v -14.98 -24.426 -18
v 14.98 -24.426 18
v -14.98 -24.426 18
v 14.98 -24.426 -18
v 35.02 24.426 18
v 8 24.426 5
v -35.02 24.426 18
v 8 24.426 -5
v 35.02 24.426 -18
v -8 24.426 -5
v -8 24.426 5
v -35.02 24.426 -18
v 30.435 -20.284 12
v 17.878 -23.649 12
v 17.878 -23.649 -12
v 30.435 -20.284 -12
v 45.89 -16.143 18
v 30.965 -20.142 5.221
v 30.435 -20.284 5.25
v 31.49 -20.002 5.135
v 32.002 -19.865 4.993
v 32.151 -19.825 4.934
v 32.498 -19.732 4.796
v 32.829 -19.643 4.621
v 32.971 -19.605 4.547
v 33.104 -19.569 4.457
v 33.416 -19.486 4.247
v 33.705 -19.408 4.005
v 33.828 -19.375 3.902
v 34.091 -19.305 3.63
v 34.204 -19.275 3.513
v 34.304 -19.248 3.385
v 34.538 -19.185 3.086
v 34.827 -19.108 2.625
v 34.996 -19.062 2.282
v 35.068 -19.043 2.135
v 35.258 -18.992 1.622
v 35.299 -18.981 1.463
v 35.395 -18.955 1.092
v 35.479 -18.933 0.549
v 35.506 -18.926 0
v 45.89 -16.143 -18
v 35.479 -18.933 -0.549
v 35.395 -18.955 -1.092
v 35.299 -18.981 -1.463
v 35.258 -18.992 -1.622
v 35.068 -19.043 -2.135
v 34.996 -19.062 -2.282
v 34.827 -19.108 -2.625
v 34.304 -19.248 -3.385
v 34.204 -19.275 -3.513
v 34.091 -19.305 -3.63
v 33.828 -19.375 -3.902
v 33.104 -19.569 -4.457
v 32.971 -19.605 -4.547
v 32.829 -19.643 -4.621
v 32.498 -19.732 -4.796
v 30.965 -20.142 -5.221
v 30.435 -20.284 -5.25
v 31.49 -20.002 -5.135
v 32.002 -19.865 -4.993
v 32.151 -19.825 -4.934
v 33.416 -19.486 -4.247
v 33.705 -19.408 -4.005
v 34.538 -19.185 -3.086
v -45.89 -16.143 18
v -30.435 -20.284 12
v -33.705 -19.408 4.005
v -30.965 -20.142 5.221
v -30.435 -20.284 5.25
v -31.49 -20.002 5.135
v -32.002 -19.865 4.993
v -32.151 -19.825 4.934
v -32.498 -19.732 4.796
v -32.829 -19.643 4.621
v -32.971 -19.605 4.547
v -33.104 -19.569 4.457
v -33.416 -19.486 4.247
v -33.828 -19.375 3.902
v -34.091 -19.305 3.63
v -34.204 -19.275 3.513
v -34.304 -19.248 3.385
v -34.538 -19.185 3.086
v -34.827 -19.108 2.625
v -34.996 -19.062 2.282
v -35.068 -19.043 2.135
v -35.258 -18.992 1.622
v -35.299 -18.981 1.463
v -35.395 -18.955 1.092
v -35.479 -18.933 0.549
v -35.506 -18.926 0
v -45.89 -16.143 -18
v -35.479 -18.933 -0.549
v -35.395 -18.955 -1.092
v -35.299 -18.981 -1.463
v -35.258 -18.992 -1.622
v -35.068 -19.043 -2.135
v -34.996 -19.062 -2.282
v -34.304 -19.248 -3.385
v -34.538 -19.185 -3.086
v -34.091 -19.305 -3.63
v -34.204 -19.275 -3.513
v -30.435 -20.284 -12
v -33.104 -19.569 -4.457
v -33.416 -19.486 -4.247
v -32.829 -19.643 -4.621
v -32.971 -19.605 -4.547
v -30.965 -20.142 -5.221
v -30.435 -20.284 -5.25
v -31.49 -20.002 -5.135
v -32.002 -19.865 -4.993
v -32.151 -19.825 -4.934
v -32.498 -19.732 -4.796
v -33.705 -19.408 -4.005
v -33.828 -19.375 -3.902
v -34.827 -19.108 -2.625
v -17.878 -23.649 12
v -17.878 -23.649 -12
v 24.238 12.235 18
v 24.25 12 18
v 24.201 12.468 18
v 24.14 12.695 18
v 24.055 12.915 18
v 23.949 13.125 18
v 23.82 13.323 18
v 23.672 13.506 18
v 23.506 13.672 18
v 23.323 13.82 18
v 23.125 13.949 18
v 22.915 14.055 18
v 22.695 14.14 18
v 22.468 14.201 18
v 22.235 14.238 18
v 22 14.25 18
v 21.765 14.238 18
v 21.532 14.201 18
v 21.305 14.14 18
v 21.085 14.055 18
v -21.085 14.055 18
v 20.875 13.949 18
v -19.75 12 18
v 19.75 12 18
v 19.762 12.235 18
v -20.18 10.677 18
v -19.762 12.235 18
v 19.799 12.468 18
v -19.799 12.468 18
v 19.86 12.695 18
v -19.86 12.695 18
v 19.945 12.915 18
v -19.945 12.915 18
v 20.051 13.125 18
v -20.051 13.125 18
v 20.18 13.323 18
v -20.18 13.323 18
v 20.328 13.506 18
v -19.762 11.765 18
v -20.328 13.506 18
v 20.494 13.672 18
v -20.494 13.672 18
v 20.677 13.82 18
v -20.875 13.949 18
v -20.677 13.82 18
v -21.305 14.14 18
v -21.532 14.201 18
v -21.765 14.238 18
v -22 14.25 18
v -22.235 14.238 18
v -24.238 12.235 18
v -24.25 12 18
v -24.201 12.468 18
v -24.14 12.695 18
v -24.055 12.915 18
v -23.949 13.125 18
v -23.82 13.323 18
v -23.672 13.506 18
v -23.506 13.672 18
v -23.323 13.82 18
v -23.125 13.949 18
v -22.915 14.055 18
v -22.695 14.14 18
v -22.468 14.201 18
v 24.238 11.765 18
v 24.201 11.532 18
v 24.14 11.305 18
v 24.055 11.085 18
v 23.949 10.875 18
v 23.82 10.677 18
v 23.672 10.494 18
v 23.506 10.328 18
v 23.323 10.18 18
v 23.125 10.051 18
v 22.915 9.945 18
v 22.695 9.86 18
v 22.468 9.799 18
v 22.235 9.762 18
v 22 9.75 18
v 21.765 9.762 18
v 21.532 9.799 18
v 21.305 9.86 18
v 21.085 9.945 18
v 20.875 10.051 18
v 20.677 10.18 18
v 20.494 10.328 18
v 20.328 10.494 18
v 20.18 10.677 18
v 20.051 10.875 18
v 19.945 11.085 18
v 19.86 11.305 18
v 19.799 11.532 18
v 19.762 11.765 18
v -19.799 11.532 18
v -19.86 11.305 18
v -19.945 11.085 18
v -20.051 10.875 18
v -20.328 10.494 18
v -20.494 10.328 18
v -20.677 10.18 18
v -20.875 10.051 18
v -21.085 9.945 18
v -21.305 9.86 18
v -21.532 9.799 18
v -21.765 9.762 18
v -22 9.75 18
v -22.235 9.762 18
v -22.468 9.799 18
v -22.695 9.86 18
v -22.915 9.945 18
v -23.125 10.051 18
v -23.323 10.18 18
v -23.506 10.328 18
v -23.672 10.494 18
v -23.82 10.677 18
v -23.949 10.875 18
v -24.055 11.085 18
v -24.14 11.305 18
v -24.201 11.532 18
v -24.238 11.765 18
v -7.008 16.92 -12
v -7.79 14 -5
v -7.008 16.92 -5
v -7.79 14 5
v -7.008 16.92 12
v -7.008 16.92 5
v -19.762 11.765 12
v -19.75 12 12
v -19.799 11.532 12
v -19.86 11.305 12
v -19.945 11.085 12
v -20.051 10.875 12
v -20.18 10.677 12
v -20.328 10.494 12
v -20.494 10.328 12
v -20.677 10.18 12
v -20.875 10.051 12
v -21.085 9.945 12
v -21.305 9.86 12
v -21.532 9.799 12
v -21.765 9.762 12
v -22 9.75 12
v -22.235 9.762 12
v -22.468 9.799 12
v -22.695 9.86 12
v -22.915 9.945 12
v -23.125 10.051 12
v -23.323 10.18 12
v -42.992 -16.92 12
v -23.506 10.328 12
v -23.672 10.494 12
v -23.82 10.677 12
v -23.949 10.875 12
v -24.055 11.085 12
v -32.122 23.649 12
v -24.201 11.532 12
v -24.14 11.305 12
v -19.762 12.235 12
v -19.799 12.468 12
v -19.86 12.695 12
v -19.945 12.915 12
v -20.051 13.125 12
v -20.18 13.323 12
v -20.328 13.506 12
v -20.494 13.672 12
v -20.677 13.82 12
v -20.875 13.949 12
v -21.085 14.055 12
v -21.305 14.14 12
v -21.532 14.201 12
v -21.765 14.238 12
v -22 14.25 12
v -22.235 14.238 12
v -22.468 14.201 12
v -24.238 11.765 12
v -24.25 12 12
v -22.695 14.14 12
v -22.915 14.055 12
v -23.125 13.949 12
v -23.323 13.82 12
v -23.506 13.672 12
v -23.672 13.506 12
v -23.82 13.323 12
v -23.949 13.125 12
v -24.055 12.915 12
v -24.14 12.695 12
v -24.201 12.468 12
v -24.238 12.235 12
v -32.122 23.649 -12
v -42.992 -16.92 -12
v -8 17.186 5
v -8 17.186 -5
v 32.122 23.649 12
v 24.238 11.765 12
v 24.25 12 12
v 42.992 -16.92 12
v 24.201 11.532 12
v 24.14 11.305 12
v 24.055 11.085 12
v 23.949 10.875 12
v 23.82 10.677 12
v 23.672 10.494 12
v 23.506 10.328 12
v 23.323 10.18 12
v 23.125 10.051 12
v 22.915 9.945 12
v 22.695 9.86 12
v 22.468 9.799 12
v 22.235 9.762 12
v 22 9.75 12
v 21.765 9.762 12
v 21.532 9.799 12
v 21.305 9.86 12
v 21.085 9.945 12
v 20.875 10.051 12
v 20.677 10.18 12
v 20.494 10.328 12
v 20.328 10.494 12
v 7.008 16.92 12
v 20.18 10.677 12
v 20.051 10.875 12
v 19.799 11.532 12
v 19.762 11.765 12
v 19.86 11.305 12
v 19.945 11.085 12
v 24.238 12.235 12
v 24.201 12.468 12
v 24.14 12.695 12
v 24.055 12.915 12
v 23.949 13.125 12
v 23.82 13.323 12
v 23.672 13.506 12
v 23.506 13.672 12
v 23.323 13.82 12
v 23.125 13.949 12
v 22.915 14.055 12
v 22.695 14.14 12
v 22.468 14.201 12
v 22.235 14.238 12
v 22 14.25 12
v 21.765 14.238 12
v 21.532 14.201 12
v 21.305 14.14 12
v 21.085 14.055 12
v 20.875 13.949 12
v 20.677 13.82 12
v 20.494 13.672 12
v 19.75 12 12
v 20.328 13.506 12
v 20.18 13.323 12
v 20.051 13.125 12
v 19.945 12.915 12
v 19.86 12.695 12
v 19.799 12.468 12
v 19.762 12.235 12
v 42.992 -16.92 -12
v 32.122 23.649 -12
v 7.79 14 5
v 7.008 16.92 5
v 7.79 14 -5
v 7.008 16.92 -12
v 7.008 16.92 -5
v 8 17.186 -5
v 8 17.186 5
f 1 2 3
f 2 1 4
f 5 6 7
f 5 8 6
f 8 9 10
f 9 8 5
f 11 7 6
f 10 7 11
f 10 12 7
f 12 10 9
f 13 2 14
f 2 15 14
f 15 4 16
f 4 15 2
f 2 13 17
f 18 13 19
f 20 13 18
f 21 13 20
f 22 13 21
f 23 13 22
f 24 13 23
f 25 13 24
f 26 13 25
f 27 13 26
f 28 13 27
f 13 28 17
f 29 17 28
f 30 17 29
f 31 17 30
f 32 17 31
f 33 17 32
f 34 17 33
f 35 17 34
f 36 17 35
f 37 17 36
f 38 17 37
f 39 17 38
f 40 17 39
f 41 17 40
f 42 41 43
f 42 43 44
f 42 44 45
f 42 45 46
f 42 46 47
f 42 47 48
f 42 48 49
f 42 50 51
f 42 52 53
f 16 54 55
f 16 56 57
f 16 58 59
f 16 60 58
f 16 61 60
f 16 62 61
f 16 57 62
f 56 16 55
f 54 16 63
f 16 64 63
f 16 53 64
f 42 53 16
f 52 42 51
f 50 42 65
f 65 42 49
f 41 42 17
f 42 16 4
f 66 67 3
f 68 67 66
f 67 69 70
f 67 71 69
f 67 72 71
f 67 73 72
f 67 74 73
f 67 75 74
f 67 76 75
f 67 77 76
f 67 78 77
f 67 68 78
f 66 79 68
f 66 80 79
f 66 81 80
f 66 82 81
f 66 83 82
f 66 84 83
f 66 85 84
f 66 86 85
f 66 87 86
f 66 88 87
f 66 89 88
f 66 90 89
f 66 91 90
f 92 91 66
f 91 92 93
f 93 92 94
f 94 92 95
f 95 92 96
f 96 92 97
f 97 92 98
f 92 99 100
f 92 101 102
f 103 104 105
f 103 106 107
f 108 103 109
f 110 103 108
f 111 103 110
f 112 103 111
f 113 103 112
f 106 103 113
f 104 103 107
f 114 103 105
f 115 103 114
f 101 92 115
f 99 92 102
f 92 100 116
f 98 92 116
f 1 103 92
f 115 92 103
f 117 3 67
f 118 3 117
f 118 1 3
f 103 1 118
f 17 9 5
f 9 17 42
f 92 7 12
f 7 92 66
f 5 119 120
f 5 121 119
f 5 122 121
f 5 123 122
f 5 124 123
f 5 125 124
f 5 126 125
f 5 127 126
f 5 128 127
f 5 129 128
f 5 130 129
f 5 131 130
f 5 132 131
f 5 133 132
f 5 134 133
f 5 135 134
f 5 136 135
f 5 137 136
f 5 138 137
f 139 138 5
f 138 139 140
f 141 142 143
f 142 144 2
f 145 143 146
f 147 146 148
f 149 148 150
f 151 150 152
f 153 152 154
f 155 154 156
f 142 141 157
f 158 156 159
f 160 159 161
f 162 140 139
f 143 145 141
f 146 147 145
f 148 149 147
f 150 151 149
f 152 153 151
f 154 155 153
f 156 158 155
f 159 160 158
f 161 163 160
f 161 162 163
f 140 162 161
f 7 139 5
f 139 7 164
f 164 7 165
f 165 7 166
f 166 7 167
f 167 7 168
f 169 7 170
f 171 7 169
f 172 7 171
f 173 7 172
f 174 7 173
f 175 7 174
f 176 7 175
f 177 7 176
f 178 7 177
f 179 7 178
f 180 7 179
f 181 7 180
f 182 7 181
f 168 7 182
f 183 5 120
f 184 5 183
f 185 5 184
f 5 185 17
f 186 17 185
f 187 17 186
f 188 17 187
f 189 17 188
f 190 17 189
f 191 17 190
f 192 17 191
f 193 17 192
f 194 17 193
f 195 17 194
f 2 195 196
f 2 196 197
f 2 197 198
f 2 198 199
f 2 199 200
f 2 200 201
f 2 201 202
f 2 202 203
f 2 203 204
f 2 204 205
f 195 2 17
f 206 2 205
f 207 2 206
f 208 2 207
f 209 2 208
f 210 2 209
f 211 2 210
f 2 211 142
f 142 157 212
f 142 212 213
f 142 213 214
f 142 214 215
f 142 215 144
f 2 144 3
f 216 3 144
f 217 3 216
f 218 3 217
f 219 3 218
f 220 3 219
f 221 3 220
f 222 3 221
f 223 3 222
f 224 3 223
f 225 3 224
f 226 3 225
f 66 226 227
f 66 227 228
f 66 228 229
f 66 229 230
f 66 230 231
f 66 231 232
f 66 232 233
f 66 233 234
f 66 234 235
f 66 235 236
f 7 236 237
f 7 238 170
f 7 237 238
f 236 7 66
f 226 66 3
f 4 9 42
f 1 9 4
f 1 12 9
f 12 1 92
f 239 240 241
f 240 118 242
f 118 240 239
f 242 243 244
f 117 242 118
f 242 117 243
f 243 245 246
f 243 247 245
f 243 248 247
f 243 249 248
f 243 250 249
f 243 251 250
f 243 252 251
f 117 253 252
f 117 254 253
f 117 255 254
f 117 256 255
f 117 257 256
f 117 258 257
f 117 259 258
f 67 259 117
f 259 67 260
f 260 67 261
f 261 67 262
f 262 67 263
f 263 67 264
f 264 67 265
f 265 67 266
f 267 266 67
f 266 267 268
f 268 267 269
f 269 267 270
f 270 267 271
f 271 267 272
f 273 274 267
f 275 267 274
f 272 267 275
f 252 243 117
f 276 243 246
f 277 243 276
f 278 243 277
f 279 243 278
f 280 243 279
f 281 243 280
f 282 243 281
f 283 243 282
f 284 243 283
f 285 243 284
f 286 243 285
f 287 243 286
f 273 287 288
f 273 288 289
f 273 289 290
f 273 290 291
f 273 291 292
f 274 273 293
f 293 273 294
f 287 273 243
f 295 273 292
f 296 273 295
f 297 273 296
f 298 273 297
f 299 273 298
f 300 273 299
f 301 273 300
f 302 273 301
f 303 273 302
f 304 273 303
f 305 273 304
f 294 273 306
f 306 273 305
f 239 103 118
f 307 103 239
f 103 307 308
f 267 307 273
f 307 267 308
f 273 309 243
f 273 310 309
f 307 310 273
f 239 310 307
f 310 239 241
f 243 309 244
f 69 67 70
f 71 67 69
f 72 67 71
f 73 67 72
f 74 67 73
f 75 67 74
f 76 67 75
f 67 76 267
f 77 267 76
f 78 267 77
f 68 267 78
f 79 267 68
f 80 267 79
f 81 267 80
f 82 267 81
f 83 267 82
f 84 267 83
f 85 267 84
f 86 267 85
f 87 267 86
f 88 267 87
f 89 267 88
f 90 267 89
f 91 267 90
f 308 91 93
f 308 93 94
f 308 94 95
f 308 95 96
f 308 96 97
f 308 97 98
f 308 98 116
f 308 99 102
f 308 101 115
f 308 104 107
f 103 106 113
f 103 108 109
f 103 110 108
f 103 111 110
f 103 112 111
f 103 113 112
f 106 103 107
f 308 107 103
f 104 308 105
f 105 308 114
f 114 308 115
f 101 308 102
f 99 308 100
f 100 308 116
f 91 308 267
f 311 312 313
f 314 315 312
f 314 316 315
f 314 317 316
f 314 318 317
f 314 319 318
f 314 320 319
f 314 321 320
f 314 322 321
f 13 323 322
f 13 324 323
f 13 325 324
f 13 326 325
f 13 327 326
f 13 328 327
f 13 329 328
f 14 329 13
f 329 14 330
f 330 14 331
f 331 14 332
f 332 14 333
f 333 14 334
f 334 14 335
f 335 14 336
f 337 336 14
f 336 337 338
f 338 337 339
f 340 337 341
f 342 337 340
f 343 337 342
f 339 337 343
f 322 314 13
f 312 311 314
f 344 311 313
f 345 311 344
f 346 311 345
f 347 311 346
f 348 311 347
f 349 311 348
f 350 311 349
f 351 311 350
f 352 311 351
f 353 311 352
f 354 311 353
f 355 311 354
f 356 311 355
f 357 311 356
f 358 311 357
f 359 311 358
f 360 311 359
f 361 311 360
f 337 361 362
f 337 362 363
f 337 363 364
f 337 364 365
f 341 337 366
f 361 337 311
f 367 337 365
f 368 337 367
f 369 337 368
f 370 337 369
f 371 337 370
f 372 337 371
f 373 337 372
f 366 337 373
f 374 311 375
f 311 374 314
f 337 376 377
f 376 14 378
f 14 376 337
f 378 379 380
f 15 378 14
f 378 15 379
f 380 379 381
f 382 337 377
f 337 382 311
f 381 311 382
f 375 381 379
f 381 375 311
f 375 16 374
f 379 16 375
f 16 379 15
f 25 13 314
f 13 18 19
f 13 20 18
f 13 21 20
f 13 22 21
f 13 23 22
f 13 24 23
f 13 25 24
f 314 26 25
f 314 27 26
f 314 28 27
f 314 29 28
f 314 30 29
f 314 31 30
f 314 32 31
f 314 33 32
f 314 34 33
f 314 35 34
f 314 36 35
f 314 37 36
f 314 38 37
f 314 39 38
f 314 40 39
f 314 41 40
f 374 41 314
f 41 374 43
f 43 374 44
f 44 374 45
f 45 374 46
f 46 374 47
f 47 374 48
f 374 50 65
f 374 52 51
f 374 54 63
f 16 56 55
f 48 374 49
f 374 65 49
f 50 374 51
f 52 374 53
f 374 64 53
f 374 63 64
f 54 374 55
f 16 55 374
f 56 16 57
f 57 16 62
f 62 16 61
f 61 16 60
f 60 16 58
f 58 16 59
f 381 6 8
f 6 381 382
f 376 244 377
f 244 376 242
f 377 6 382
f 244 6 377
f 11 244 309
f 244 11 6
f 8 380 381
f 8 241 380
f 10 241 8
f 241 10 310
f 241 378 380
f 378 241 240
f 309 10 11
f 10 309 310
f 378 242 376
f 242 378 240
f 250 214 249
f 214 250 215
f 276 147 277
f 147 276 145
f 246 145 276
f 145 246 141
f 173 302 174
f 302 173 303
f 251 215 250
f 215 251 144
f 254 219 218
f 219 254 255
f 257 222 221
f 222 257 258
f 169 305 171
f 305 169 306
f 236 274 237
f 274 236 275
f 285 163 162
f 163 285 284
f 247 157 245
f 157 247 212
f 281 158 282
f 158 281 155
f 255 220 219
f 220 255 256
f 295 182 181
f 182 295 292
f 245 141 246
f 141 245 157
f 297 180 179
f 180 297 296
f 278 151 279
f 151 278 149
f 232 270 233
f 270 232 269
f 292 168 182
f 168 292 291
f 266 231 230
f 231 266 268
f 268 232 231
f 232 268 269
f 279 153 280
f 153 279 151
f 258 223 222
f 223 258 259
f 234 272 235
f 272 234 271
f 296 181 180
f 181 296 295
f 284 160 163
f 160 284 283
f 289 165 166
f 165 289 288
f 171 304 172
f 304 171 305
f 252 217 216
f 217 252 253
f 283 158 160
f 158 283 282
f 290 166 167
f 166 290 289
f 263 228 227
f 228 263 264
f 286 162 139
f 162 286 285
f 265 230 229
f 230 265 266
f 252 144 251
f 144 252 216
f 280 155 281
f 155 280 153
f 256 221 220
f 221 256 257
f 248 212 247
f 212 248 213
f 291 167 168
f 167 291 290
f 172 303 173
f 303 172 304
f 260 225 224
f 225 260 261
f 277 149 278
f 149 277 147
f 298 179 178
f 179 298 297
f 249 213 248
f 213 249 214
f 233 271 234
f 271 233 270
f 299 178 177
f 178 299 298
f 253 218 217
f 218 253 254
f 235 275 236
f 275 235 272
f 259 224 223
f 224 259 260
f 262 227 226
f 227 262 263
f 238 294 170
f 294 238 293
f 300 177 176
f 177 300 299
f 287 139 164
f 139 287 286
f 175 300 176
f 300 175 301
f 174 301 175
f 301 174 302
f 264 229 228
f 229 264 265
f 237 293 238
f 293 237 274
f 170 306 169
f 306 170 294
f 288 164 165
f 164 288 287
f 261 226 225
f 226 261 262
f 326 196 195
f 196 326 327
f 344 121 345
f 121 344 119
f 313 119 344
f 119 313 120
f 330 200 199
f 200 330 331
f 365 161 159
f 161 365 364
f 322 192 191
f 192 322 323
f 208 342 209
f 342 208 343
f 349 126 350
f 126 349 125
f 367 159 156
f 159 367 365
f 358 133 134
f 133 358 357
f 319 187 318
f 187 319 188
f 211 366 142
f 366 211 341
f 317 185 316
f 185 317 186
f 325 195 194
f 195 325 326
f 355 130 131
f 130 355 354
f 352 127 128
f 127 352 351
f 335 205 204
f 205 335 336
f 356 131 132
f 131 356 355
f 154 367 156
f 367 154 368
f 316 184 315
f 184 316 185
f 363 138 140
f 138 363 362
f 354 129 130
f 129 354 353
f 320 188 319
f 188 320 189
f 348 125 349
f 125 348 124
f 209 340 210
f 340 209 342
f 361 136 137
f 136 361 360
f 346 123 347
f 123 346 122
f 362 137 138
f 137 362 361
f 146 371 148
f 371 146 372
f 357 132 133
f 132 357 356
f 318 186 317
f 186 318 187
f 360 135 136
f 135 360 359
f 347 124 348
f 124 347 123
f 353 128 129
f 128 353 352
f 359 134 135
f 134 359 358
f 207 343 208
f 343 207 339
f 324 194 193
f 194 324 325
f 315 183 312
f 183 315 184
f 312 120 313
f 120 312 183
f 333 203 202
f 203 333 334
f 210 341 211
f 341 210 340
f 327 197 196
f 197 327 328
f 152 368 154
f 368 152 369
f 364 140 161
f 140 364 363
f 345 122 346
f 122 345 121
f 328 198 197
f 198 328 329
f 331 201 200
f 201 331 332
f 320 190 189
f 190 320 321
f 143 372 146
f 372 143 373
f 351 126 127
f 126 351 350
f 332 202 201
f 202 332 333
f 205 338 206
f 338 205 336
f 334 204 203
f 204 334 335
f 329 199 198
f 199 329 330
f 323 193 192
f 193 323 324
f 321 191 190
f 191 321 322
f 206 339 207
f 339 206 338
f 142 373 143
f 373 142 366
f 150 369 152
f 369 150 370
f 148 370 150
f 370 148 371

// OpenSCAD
// ==============================================================================
// Indriyo (ইন্দ্রিয়) - Dual ESP32-CAM Tail Stealth Pod
// Parametric 3D Printable Enclosure for Motorcycle Rearview ADAS
// ==============================================================================

$fn = 60;

// Dimensions (in millimeters)
wall_thickness = 2.4;
pod_width = 86;
pod_depth = 42;
pod_height = 36;
splay_angle = 15; // 15 degrees outward splay for each camera to cover blind spots
lens_diameter = 10.5;
lens_hood_depth = 5.0;

module camera_bracket() {
    difference() {
        // Module outer shell
        cube([28, 40, 26], center=true);
        // ESP32-CAM board cavity (AI-Thinker: 27 x 40.5 mm)
        cube([25, 41, 23], center=true);
        // Lens hole
        translate([0, -20, 0])
            rotate([90, 0, 0])
                cylinder(h=10, d=lens_diameter, center=true);
    }
    // Rain visor / sun hood
    translate([0, -21, 5])
        cube([18, lens_hood_depth, 3], center=true);
}

module indriyo_dual_pod() {
    difference() {
        // Main aerodynamic housing
        hull() {
            translate([-25, 0, 0]) rotate([0, 0, -splay_angle]) cube([32, pod_depth, pod_height], center=true);
            translate([25, 0, 0]) rotate([0, 0, splay_angle]) cube([32, pod_depth, pod_height], center=true);
        }

        // Left camera cavity
        translate([-25, 0, 0])
            rotate([0, 0, -splay_angle])
                cube([26, 42, 24], center=true);

        // Right camera cavity
        translate([25, 0, 0])
            rotate([0, 0, splay_angle])
                cube([26, 42, 24], center=true);

        // Left lens aperture
        translate([-25, 0, 0])
            rotate([0, 0, -splay_angle])
                translate([0, -25, 0])
                    rotate([90, 0, 0])
                        cylinder(h=20, d=lens_diameter, center=true);

        // Right lens aperture
        translate([25, 0, 0])
            rotate([0, 0, splay_angle])
                translate([0, -25, 0])
                    rotate([90, 0, 0])
                        cylinder(h=20, d=lens_diameter, center=true);

        // Rear wire exit canal
        translate([0, 20, 0])
            cube([16, 12, 10], center=true);

        // License plate bracket mounting slots (M4 / M5 screws)
        translate([-22, 12, pod_height/2 - 2])
            cylinder(h=10, d=4.5, center=true);
        translate([22, 12, pod_height/2 - 2])
            cylinder(h=10, d=4.5, center=true);
    }
}

indriyo_dual_pod();
